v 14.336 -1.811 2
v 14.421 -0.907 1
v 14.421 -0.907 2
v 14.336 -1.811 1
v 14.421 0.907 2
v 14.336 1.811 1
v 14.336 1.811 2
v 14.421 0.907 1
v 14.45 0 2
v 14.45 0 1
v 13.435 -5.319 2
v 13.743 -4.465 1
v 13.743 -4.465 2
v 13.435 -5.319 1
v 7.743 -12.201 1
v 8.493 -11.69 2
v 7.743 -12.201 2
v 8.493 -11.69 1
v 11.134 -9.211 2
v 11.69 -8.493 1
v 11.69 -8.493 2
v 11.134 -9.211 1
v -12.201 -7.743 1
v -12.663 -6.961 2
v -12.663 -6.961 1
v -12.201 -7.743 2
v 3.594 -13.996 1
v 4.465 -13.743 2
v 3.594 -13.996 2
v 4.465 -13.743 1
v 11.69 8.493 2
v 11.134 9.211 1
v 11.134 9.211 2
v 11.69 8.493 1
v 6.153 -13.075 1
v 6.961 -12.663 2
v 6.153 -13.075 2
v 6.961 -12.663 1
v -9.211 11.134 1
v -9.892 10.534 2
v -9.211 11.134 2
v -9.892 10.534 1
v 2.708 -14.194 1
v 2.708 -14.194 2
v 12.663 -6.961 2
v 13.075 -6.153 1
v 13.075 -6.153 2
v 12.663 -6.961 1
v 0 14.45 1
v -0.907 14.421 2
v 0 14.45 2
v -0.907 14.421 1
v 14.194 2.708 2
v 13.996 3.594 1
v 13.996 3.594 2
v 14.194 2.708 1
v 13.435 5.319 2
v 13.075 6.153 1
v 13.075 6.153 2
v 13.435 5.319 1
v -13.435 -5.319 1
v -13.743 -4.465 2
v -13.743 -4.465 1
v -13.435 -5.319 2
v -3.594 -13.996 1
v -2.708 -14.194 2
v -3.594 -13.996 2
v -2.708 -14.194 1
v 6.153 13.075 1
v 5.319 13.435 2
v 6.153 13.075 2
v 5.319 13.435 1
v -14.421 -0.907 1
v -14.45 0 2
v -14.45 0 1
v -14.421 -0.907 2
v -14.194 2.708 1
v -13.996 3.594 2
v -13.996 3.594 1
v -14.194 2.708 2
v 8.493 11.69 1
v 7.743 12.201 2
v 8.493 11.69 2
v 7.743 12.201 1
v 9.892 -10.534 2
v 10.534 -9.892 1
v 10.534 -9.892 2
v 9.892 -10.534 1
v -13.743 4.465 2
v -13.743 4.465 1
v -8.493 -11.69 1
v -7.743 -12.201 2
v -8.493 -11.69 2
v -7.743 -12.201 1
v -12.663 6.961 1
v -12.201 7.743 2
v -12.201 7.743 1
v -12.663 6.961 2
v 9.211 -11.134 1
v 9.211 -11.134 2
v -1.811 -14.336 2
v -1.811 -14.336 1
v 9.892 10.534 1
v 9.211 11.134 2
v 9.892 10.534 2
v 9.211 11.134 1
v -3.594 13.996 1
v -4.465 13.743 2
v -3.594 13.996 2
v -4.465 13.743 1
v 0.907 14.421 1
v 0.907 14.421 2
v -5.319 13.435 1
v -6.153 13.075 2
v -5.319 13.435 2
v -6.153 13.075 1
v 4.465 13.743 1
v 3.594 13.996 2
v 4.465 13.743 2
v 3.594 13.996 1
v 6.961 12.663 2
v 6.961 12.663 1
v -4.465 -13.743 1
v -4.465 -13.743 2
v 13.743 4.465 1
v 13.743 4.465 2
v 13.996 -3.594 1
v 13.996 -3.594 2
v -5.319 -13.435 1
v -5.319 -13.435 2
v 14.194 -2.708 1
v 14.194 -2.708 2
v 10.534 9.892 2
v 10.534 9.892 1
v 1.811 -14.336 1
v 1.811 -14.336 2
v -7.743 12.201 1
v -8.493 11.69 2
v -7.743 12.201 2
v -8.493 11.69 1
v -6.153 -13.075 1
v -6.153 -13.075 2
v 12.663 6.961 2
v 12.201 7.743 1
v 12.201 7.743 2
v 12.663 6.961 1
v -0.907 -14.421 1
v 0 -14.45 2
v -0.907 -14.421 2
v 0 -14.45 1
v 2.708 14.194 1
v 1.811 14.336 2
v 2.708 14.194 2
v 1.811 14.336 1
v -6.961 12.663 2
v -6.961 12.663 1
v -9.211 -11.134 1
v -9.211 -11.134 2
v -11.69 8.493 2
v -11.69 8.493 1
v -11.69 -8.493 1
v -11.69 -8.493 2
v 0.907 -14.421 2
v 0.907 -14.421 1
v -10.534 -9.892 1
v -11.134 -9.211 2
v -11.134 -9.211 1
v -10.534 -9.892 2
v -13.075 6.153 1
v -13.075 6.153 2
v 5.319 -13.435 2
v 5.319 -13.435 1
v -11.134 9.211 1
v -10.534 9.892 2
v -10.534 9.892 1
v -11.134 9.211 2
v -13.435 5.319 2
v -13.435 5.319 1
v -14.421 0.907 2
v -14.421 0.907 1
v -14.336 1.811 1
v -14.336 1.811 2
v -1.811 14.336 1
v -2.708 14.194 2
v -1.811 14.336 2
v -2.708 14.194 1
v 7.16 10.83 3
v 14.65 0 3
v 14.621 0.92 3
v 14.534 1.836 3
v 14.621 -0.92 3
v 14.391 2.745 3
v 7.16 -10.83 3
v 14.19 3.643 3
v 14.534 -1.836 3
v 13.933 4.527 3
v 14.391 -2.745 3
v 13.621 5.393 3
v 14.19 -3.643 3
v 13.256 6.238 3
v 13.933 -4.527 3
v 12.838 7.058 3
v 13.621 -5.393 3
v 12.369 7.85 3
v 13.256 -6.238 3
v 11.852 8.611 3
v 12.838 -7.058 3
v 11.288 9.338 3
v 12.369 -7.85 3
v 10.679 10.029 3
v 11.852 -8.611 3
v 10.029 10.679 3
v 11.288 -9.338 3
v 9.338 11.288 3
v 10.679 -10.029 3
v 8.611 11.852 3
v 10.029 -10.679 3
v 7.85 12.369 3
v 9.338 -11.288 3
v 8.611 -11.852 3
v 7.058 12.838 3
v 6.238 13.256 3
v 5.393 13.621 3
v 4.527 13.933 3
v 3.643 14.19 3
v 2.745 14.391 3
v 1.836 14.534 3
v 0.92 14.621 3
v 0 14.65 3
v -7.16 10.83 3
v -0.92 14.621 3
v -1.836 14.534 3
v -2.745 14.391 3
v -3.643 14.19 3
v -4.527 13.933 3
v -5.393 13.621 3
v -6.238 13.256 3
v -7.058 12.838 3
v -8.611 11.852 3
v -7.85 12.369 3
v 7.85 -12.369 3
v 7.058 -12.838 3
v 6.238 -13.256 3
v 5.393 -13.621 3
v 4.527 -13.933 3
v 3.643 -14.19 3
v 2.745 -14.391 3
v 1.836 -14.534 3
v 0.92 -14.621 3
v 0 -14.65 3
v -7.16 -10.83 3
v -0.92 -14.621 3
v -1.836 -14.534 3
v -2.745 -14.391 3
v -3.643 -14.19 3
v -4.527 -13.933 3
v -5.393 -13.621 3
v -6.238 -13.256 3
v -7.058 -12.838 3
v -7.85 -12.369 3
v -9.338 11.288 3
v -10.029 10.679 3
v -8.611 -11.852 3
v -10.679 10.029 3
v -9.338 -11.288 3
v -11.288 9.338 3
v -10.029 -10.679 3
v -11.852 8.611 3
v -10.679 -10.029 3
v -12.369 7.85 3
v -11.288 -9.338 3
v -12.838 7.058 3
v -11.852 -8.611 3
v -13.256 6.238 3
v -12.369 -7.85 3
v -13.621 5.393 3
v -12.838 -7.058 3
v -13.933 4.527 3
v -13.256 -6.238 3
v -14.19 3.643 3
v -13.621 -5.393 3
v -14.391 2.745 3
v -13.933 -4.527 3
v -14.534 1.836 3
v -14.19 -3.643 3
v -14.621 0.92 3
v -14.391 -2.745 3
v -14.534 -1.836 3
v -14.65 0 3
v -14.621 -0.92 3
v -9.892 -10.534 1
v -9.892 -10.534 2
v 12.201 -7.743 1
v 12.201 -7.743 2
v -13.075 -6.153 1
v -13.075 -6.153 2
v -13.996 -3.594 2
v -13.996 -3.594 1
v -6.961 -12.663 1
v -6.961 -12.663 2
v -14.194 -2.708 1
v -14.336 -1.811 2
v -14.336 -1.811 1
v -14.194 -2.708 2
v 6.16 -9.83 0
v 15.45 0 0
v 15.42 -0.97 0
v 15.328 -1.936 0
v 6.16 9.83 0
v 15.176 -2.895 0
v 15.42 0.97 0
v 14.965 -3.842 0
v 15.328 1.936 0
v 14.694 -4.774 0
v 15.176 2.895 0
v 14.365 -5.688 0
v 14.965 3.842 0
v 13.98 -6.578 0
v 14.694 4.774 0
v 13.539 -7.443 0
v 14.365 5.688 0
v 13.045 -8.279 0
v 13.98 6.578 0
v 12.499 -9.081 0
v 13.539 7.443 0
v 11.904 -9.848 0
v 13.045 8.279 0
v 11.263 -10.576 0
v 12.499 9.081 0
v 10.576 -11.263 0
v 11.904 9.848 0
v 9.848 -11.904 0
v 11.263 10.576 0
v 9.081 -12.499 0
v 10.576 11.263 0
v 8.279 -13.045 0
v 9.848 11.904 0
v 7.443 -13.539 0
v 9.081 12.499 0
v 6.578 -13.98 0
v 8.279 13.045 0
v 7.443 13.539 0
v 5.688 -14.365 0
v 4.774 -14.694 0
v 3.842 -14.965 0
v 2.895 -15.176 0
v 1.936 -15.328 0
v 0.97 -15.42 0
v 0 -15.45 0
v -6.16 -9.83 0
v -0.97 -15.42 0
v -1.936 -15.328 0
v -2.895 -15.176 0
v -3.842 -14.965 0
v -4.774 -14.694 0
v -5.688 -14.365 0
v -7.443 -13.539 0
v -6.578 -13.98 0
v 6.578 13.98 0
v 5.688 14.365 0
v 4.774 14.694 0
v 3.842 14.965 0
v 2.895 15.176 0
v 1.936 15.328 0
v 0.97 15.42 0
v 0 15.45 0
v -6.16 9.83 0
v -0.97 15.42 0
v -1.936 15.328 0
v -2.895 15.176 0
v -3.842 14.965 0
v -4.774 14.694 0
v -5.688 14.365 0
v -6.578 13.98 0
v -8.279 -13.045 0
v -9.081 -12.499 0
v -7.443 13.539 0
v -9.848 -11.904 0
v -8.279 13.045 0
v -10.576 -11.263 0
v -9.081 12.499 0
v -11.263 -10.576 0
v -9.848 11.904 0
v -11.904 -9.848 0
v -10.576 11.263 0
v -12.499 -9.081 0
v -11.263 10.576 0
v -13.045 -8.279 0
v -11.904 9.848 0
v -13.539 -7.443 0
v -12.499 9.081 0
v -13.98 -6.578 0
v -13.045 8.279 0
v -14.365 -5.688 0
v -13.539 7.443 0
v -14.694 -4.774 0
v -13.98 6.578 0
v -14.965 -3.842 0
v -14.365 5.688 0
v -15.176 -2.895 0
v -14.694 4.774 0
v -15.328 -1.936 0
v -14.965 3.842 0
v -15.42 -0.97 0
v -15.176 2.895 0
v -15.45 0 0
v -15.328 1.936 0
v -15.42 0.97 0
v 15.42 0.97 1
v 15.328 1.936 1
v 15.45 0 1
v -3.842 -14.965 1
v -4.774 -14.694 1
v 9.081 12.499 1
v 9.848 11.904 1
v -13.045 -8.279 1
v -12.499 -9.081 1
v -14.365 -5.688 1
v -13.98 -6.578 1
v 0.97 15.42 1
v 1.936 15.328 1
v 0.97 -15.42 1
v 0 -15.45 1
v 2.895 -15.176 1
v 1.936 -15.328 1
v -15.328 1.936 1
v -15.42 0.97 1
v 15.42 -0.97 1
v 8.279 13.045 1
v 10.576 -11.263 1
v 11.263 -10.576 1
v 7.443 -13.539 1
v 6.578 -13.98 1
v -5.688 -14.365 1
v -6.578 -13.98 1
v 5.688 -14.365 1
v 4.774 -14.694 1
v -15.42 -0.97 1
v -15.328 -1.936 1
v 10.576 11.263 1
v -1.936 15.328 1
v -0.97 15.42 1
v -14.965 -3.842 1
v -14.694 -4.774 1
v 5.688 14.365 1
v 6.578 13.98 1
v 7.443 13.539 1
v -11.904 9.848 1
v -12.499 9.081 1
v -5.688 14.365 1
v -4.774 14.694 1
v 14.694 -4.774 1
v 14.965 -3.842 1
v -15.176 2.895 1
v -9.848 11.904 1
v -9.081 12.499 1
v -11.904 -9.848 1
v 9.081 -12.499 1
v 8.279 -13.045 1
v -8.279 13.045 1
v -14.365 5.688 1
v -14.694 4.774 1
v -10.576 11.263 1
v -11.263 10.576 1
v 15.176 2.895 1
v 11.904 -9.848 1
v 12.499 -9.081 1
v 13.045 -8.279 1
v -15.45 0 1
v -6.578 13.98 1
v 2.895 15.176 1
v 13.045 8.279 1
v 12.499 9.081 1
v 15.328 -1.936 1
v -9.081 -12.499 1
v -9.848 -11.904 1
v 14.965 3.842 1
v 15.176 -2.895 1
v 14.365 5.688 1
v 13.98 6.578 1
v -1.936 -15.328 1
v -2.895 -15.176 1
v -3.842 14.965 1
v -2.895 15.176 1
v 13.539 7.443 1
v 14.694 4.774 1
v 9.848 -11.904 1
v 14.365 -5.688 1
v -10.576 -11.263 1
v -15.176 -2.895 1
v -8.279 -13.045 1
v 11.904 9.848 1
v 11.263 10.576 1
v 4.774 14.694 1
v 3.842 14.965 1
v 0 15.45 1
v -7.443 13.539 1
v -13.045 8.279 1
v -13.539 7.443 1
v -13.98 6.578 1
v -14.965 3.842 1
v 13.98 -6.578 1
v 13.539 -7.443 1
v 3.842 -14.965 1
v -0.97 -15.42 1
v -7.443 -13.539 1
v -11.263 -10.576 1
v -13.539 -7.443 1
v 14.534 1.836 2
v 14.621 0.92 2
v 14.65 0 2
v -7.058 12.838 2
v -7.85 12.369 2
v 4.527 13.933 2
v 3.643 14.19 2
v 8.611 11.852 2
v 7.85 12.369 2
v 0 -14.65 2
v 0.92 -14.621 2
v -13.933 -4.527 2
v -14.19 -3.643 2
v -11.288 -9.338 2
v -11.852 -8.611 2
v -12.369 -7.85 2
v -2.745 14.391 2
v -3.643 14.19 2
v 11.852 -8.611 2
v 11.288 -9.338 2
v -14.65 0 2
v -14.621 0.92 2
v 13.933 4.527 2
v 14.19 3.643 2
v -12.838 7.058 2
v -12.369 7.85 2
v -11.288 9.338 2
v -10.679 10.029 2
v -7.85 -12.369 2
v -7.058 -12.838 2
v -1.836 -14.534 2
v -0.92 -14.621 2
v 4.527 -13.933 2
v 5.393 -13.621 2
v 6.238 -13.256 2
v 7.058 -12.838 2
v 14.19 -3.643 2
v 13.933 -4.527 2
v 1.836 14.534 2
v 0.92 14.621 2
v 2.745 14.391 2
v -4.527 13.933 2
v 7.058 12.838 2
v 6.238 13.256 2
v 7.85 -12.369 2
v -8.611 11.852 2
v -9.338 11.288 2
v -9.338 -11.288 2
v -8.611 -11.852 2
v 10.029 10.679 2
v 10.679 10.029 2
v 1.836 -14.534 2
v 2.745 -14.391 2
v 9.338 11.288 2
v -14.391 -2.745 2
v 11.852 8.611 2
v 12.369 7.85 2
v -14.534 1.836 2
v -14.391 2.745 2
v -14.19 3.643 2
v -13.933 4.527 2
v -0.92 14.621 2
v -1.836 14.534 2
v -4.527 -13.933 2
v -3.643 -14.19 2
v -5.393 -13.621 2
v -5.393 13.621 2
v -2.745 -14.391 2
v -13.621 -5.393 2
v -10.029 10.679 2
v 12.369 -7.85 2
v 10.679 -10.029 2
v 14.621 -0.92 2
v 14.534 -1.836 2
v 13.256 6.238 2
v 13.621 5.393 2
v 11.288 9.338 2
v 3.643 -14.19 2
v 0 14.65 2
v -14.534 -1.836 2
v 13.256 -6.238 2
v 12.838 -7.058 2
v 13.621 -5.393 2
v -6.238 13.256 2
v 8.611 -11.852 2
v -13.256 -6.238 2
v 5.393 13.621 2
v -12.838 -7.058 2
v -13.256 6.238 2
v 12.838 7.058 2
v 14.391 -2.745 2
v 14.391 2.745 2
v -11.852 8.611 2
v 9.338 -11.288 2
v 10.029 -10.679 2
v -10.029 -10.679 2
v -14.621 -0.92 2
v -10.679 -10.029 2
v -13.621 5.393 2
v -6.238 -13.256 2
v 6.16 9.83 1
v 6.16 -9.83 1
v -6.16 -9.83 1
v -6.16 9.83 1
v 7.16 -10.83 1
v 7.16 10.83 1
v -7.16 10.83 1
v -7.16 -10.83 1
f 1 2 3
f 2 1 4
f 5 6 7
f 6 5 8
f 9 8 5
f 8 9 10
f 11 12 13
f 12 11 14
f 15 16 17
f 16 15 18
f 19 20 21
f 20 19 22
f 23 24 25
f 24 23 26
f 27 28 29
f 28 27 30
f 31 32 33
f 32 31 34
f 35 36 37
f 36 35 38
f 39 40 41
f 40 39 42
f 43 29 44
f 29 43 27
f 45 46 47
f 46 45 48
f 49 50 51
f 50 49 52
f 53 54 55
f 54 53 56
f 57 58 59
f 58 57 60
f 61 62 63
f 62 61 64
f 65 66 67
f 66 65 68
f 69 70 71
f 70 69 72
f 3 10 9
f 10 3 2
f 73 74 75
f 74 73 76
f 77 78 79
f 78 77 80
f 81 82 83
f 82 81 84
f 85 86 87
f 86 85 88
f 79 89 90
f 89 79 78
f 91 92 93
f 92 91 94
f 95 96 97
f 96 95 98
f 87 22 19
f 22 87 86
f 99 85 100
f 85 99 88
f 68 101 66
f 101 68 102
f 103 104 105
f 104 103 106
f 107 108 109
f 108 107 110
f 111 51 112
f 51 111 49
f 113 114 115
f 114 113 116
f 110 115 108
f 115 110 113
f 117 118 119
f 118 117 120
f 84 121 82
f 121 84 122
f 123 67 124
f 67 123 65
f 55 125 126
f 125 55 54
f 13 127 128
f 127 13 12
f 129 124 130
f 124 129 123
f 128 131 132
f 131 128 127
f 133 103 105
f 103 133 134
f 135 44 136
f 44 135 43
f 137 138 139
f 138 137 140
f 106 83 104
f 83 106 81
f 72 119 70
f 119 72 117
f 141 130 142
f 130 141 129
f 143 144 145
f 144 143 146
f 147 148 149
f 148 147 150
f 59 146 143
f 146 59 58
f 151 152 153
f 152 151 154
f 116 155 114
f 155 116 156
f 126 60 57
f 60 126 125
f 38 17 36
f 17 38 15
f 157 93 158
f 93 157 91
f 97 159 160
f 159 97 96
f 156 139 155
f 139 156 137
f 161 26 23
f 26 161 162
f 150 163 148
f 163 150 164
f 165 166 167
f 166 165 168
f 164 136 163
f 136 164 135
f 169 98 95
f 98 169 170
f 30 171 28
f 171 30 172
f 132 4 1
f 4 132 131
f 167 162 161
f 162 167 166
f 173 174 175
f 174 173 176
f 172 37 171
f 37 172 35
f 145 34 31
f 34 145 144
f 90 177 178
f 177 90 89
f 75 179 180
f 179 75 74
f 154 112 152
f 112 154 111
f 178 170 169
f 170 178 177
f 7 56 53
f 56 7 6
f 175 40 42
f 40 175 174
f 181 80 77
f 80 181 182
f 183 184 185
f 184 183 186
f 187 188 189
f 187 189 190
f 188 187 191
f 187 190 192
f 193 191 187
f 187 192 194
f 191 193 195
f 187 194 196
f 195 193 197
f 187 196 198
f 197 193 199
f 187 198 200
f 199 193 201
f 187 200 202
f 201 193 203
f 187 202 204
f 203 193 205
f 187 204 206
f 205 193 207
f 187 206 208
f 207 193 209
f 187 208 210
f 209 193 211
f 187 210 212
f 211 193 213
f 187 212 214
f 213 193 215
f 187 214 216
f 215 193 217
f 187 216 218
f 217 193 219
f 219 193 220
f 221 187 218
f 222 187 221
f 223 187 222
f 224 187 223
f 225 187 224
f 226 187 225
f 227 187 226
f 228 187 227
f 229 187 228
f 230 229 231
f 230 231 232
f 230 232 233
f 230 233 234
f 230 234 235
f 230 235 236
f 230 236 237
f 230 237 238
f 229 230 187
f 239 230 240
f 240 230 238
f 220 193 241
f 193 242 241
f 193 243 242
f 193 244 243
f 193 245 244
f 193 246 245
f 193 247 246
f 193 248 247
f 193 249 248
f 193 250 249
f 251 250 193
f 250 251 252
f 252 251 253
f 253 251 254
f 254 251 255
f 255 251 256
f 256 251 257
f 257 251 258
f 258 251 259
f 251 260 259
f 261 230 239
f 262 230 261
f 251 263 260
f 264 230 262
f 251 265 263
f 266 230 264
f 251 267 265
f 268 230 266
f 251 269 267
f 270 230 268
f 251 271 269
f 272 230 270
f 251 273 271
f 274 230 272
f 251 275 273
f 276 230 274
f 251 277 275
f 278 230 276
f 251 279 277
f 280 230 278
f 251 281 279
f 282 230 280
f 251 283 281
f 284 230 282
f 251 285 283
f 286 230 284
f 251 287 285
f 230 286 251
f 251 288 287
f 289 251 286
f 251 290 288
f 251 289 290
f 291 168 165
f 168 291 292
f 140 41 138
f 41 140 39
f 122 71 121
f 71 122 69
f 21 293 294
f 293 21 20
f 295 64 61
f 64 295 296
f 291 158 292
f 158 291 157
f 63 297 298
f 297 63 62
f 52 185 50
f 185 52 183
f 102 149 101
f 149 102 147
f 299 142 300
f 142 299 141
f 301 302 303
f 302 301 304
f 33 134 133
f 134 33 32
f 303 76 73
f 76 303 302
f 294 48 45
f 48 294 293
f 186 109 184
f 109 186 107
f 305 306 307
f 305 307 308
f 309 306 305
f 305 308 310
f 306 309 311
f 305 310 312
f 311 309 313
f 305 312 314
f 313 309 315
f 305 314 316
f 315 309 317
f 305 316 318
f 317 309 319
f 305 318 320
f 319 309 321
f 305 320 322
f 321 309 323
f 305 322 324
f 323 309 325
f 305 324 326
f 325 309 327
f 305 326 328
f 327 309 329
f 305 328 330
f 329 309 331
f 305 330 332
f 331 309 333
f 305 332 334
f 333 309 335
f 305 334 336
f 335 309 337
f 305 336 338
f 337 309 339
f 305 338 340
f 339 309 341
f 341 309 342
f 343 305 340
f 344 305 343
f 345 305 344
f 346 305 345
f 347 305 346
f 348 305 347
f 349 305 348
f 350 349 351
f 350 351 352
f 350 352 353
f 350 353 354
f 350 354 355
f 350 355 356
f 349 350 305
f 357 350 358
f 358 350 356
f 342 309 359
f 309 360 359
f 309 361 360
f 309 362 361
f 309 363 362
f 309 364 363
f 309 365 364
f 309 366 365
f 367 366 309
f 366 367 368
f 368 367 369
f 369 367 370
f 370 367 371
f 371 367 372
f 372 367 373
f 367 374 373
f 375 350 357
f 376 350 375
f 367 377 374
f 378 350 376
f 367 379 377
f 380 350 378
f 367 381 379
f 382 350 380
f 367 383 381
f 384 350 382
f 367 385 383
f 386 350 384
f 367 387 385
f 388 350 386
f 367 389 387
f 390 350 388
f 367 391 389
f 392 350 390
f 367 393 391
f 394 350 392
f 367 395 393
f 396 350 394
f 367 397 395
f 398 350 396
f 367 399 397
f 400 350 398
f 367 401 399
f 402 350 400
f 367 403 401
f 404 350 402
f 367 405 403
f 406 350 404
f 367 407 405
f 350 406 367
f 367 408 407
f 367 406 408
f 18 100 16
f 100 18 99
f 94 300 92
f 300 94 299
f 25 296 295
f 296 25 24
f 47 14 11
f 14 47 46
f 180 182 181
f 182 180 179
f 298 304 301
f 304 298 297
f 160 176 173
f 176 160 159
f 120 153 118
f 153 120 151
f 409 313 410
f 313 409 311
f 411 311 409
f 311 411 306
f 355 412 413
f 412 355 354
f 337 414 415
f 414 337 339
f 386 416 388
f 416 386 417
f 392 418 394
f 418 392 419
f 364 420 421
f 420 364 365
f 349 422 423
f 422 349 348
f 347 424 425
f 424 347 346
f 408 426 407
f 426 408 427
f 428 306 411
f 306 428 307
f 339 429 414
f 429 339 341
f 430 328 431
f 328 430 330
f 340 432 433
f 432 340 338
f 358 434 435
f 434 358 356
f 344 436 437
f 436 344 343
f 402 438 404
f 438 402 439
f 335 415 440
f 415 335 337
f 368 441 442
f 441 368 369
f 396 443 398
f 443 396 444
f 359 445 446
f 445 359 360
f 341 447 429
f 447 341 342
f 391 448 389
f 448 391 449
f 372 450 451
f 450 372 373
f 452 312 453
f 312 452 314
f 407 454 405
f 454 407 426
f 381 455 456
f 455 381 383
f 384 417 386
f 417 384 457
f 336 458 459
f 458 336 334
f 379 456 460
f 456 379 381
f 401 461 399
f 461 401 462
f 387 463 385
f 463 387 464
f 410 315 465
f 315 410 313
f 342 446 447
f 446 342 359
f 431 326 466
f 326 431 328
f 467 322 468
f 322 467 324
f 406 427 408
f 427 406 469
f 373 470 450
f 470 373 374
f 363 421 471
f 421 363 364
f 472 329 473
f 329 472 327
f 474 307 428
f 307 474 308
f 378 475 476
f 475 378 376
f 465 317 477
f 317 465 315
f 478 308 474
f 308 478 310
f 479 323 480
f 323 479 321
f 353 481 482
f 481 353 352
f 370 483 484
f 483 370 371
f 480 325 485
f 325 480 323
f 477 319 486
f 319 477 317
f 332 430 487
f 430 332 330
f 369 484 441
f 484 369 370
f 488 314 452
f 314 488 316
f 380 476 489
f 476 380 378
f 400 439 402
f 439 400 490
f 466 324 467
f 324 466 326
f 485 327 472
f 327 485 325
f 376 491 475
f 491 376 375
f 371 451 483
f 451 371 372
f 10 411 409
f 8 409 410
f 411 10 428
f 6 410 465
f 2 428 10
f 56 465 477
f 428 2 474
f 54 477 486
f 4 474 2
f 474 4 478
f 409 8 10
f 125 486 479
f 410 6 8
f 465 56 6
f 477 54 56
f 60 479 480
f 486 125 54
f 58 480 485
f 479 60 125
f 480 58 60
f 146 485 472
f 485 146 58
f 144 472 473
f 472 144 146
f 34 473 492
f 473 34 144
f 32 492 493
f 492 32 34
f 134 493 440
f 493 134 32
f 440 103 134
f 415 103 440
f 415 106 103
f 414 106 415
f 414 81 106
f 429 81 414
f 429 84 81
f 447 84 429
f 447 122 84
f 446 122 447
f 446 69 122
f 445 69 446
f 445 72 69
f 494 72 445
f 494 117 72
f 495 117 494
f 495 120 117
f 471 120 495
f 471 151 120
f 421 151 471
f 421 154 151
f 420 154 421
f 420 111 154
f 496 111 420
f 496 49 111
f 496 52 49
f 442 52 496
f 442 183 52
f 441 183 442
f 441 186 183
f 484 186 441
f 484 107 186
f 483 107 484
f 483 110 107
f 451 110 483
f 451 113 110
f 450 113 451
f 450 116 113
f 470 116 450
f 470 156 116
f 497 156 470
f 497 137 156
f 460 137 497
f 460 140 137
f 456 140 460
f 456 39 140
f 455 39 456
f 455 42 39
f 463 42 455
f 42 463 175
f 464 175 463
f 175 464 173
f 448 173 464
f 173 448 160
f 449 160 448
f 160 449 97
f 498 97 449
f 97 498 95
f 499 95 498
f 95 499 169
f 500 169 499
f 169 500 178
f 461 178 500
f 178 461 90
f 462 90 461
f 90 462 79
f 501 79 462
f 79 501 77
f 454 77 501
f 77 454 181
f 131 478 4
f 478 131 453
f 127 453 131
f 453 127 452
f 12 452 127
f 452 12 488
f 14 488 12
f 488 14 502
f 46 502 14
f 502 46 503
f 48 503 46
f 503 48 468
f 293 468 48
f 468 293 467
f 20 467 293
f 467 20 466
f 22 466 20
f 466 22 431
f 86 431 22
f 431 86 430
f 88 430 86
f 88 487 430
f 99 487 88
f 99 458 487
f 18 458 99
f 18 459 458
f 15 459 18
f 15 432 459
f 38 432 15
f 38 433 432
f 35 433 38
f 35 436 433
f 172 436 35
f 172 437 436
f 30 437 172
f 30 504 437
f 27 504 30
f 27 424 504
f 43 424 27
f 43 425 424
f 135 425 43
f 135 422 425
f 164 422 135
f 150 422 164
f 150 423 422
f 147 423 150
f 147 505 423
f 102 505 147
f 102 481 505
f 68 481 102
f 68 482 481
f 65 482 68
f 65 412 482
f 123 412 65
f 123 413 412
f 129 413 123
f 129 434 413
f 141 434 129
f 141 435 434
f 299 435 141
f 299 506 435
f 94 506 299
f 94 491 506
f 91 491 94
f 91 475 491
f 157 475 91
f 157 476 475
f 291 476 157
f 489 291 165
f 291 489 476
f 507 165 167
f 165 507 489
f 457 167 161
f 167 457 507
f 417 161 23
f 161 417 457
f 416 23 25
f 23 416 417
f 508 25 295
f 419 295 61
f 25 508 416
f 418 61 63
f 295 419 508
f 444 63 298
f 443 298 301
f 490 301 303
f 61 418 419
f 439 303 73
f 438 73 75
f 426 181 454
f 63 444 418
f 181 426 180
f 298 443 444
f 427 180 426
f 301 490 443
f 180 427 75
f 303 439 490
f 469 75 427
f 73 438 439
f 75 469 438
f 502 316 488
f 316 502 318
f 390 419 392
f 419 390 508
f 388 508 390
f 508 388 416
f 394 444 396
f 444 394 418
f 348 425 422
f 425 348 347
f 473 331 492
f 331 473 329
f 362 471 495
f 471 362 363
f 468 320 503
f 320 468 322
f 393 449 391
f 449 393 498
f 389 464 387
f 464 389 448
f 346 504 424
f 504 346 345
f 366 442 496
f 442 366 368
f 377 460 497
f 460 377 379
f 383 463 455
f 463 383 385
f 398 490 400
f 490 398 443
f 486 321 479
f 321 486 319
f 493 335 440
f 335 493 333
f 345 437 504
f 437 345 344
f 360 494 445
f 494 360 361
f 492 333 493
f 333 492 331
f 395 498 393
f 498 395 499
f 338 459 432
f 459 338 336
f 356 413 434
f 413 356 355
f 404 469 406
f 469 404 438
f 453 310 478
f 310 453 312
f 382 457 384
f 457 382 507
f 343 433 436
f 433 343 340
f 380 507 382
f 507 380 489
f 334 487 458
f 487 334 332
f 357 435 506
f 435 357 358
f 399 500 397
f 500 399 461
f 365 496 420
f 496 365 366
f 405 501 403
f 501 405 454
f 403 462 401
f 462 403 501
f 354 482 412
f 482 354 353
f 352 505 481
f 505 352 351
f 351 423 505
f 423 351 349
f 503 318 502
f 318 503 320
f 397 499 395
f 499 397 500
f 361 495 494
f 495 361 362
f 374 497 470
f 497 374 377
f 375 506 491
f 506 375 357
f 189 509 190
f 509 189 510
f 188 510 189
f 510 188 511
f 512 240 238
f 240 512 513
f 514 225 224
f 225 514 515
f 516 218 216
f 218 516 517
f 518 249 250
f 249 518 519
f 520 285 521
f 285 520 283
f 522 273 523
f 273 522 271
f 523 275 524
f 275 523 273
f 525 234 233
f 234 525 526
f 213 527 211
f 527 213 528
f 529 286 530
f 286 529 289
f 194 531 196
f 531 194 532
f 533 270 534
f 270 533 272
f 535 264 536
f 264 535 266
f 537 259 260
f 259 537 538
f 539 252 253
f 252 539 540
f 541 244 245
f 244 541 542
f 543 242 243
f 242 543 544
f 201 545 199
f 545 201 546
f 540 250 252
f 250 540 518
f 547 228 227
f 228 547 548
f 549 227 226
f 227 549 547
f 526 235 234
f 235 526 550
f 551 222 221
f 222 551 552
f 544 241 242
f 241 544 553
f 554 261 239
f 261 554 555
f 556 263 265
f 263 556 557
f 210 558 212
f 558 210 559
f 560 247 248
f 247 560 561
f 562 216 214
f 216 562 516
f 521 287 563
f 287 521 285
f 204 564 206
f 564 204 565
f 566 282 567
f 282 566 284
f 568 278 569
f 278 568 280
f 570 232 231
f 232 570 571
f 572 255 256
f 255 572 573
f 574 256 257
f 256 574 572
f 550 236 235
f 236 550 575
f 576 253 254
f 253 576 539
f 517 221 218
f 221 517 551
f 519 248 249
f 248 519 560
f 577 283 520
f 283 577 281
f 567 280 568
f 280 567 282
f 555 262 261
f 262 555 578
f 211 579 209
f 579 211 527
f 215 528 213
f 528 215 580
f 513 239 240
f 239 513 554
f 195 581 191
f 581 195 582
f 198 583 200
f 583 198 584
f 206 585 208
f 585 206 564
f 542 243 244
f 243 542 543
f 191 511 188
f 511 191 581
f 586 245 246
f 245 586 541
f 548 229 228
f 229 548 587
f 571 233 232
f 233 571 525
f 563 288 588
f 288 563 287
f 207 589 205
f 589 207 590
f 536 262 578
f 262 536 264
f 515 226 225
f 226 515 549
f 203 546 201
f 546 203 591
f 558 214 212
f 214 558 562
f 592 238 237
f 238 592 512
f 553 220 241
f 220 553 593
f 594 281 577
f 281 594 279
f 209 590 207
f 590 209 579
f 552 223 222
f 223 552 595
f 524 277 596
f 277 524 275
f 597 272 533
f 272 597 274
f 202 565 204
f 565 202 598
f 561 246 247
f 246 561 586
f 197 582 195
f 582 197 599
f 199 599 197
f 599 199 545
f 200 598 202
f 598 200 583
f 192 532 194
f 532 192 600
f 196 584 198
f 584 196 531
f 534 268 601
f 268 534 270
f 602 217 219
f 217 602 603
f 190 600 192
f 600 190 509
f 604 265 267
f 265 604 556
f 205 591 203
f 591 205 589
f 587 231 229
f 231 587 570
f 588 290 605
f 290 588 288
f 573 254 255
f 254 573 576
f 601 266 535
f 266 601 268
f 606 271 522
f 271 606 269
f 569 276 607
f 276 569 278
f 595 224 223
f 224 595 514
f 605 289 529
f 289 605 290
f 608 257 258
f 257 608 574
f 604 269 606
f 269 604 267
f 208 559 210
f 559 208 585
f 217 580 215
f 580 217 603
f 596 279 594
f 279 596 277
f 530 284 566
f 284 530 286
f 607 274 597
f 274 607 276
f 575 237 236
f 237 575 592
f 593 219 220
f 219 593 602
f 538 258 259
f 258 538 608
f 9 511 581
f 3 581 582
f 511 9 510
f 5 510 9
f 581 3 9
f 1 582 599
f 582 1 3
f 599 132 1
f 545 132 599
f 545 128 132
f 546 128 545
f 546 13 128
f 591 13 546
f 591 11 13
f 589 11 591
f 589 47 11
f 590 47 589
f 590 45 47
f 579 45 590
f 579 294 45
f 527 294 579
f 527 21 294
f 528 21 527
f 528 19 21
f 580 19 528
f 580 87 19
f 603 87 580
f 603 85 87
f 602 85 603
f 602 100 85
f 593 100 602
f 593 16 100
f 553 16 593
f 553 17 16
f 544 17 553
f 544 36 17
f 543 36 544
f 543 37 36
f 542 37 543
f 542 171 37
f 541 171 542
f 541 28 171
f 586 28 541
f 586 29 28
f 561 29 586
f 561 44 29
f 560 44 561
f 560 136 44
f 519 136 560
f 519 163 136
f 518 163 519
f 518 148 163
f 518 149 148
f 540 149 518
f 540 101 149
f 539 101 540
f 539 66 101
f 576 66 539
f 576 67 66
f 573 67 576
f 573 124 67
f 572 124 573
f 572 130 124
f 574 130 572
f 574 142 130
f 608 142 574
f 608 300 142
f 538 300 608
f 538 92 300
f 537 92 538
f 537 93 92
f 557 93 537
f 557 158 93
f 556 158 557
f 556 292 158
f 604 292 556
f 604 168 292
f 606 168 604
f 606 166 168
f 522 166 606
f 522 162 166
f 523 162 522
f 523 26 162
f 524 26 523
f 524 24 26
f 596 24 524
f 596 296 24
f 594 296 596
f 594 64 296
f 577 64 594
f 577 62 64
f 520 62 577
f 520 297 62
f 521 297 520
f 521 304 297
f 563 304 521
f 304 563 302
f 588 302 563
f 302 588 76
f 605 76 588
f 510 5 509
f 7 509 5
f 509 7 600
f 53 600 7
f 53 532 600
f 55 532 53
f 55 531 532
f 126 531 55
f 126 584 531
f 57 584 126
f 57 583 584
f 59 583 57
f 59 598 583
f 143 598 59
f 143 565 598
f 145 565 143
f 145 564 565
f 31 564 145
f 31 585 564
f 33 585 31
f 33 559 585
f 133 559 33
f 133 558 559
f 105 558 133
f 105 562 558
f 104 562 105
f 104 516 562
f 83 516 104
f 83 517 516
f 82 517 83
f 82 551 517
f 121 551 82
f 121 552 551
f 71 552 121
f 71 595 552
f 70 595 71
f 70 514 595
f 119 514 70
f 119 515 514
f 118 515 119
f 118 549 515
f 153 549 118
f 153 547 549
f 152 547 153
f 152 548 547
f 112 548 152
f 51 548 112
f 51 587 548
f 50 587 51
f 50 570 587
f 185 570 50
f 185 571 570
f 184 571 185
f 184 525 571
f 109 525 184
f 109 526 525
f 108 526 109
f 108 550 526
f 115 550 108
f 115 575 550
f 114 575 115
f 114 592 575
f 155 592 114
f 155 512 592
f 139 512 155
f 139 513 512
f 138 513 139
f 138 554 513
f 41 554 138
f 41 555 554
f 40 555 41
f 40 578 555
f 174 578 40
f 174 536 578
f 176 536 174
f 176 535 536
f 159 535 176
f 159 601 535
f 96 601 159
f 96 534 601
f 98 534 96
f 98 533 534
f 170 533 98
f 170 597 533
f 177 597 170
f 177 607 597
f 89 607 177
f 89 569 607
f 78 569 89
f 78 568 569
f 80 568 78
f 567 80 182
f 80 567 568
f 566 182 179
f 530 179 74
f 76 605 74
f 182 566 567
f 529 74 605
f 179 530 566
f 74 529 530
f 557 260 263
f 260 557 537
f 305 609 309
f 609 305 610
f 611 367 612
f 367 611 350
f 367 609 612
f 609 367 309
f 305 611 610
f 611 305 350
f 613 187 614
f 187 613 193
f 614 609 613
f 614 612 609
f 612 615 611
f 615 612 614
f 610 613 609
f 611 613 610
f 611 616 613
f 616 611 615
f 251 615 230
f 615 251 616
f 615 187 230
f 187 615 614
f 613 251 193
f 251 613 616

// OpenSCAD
$fn = 100;

panel_hole = 28.7+.2; // add .2 for tighter fit
panel_thickness = 1;

// kco-117
width = 12.32; // flange 14.95
height = 19.66; // flange 20.93


difference() {
  union(){
    cylinder(h=3, d=panel_hole);
    translate([0,0,0])
      cylinder(h=1, d=panel_hole+2);
    translate([0,0,2])
      cylinder(h=1, d=panel_hole+.4);  // add .4 as a snap ring
  }
  cube([width, height, 10], center=true);
  translate([0, 0, 4])
    cube([width+2, height+2, 6], center=true);
}
